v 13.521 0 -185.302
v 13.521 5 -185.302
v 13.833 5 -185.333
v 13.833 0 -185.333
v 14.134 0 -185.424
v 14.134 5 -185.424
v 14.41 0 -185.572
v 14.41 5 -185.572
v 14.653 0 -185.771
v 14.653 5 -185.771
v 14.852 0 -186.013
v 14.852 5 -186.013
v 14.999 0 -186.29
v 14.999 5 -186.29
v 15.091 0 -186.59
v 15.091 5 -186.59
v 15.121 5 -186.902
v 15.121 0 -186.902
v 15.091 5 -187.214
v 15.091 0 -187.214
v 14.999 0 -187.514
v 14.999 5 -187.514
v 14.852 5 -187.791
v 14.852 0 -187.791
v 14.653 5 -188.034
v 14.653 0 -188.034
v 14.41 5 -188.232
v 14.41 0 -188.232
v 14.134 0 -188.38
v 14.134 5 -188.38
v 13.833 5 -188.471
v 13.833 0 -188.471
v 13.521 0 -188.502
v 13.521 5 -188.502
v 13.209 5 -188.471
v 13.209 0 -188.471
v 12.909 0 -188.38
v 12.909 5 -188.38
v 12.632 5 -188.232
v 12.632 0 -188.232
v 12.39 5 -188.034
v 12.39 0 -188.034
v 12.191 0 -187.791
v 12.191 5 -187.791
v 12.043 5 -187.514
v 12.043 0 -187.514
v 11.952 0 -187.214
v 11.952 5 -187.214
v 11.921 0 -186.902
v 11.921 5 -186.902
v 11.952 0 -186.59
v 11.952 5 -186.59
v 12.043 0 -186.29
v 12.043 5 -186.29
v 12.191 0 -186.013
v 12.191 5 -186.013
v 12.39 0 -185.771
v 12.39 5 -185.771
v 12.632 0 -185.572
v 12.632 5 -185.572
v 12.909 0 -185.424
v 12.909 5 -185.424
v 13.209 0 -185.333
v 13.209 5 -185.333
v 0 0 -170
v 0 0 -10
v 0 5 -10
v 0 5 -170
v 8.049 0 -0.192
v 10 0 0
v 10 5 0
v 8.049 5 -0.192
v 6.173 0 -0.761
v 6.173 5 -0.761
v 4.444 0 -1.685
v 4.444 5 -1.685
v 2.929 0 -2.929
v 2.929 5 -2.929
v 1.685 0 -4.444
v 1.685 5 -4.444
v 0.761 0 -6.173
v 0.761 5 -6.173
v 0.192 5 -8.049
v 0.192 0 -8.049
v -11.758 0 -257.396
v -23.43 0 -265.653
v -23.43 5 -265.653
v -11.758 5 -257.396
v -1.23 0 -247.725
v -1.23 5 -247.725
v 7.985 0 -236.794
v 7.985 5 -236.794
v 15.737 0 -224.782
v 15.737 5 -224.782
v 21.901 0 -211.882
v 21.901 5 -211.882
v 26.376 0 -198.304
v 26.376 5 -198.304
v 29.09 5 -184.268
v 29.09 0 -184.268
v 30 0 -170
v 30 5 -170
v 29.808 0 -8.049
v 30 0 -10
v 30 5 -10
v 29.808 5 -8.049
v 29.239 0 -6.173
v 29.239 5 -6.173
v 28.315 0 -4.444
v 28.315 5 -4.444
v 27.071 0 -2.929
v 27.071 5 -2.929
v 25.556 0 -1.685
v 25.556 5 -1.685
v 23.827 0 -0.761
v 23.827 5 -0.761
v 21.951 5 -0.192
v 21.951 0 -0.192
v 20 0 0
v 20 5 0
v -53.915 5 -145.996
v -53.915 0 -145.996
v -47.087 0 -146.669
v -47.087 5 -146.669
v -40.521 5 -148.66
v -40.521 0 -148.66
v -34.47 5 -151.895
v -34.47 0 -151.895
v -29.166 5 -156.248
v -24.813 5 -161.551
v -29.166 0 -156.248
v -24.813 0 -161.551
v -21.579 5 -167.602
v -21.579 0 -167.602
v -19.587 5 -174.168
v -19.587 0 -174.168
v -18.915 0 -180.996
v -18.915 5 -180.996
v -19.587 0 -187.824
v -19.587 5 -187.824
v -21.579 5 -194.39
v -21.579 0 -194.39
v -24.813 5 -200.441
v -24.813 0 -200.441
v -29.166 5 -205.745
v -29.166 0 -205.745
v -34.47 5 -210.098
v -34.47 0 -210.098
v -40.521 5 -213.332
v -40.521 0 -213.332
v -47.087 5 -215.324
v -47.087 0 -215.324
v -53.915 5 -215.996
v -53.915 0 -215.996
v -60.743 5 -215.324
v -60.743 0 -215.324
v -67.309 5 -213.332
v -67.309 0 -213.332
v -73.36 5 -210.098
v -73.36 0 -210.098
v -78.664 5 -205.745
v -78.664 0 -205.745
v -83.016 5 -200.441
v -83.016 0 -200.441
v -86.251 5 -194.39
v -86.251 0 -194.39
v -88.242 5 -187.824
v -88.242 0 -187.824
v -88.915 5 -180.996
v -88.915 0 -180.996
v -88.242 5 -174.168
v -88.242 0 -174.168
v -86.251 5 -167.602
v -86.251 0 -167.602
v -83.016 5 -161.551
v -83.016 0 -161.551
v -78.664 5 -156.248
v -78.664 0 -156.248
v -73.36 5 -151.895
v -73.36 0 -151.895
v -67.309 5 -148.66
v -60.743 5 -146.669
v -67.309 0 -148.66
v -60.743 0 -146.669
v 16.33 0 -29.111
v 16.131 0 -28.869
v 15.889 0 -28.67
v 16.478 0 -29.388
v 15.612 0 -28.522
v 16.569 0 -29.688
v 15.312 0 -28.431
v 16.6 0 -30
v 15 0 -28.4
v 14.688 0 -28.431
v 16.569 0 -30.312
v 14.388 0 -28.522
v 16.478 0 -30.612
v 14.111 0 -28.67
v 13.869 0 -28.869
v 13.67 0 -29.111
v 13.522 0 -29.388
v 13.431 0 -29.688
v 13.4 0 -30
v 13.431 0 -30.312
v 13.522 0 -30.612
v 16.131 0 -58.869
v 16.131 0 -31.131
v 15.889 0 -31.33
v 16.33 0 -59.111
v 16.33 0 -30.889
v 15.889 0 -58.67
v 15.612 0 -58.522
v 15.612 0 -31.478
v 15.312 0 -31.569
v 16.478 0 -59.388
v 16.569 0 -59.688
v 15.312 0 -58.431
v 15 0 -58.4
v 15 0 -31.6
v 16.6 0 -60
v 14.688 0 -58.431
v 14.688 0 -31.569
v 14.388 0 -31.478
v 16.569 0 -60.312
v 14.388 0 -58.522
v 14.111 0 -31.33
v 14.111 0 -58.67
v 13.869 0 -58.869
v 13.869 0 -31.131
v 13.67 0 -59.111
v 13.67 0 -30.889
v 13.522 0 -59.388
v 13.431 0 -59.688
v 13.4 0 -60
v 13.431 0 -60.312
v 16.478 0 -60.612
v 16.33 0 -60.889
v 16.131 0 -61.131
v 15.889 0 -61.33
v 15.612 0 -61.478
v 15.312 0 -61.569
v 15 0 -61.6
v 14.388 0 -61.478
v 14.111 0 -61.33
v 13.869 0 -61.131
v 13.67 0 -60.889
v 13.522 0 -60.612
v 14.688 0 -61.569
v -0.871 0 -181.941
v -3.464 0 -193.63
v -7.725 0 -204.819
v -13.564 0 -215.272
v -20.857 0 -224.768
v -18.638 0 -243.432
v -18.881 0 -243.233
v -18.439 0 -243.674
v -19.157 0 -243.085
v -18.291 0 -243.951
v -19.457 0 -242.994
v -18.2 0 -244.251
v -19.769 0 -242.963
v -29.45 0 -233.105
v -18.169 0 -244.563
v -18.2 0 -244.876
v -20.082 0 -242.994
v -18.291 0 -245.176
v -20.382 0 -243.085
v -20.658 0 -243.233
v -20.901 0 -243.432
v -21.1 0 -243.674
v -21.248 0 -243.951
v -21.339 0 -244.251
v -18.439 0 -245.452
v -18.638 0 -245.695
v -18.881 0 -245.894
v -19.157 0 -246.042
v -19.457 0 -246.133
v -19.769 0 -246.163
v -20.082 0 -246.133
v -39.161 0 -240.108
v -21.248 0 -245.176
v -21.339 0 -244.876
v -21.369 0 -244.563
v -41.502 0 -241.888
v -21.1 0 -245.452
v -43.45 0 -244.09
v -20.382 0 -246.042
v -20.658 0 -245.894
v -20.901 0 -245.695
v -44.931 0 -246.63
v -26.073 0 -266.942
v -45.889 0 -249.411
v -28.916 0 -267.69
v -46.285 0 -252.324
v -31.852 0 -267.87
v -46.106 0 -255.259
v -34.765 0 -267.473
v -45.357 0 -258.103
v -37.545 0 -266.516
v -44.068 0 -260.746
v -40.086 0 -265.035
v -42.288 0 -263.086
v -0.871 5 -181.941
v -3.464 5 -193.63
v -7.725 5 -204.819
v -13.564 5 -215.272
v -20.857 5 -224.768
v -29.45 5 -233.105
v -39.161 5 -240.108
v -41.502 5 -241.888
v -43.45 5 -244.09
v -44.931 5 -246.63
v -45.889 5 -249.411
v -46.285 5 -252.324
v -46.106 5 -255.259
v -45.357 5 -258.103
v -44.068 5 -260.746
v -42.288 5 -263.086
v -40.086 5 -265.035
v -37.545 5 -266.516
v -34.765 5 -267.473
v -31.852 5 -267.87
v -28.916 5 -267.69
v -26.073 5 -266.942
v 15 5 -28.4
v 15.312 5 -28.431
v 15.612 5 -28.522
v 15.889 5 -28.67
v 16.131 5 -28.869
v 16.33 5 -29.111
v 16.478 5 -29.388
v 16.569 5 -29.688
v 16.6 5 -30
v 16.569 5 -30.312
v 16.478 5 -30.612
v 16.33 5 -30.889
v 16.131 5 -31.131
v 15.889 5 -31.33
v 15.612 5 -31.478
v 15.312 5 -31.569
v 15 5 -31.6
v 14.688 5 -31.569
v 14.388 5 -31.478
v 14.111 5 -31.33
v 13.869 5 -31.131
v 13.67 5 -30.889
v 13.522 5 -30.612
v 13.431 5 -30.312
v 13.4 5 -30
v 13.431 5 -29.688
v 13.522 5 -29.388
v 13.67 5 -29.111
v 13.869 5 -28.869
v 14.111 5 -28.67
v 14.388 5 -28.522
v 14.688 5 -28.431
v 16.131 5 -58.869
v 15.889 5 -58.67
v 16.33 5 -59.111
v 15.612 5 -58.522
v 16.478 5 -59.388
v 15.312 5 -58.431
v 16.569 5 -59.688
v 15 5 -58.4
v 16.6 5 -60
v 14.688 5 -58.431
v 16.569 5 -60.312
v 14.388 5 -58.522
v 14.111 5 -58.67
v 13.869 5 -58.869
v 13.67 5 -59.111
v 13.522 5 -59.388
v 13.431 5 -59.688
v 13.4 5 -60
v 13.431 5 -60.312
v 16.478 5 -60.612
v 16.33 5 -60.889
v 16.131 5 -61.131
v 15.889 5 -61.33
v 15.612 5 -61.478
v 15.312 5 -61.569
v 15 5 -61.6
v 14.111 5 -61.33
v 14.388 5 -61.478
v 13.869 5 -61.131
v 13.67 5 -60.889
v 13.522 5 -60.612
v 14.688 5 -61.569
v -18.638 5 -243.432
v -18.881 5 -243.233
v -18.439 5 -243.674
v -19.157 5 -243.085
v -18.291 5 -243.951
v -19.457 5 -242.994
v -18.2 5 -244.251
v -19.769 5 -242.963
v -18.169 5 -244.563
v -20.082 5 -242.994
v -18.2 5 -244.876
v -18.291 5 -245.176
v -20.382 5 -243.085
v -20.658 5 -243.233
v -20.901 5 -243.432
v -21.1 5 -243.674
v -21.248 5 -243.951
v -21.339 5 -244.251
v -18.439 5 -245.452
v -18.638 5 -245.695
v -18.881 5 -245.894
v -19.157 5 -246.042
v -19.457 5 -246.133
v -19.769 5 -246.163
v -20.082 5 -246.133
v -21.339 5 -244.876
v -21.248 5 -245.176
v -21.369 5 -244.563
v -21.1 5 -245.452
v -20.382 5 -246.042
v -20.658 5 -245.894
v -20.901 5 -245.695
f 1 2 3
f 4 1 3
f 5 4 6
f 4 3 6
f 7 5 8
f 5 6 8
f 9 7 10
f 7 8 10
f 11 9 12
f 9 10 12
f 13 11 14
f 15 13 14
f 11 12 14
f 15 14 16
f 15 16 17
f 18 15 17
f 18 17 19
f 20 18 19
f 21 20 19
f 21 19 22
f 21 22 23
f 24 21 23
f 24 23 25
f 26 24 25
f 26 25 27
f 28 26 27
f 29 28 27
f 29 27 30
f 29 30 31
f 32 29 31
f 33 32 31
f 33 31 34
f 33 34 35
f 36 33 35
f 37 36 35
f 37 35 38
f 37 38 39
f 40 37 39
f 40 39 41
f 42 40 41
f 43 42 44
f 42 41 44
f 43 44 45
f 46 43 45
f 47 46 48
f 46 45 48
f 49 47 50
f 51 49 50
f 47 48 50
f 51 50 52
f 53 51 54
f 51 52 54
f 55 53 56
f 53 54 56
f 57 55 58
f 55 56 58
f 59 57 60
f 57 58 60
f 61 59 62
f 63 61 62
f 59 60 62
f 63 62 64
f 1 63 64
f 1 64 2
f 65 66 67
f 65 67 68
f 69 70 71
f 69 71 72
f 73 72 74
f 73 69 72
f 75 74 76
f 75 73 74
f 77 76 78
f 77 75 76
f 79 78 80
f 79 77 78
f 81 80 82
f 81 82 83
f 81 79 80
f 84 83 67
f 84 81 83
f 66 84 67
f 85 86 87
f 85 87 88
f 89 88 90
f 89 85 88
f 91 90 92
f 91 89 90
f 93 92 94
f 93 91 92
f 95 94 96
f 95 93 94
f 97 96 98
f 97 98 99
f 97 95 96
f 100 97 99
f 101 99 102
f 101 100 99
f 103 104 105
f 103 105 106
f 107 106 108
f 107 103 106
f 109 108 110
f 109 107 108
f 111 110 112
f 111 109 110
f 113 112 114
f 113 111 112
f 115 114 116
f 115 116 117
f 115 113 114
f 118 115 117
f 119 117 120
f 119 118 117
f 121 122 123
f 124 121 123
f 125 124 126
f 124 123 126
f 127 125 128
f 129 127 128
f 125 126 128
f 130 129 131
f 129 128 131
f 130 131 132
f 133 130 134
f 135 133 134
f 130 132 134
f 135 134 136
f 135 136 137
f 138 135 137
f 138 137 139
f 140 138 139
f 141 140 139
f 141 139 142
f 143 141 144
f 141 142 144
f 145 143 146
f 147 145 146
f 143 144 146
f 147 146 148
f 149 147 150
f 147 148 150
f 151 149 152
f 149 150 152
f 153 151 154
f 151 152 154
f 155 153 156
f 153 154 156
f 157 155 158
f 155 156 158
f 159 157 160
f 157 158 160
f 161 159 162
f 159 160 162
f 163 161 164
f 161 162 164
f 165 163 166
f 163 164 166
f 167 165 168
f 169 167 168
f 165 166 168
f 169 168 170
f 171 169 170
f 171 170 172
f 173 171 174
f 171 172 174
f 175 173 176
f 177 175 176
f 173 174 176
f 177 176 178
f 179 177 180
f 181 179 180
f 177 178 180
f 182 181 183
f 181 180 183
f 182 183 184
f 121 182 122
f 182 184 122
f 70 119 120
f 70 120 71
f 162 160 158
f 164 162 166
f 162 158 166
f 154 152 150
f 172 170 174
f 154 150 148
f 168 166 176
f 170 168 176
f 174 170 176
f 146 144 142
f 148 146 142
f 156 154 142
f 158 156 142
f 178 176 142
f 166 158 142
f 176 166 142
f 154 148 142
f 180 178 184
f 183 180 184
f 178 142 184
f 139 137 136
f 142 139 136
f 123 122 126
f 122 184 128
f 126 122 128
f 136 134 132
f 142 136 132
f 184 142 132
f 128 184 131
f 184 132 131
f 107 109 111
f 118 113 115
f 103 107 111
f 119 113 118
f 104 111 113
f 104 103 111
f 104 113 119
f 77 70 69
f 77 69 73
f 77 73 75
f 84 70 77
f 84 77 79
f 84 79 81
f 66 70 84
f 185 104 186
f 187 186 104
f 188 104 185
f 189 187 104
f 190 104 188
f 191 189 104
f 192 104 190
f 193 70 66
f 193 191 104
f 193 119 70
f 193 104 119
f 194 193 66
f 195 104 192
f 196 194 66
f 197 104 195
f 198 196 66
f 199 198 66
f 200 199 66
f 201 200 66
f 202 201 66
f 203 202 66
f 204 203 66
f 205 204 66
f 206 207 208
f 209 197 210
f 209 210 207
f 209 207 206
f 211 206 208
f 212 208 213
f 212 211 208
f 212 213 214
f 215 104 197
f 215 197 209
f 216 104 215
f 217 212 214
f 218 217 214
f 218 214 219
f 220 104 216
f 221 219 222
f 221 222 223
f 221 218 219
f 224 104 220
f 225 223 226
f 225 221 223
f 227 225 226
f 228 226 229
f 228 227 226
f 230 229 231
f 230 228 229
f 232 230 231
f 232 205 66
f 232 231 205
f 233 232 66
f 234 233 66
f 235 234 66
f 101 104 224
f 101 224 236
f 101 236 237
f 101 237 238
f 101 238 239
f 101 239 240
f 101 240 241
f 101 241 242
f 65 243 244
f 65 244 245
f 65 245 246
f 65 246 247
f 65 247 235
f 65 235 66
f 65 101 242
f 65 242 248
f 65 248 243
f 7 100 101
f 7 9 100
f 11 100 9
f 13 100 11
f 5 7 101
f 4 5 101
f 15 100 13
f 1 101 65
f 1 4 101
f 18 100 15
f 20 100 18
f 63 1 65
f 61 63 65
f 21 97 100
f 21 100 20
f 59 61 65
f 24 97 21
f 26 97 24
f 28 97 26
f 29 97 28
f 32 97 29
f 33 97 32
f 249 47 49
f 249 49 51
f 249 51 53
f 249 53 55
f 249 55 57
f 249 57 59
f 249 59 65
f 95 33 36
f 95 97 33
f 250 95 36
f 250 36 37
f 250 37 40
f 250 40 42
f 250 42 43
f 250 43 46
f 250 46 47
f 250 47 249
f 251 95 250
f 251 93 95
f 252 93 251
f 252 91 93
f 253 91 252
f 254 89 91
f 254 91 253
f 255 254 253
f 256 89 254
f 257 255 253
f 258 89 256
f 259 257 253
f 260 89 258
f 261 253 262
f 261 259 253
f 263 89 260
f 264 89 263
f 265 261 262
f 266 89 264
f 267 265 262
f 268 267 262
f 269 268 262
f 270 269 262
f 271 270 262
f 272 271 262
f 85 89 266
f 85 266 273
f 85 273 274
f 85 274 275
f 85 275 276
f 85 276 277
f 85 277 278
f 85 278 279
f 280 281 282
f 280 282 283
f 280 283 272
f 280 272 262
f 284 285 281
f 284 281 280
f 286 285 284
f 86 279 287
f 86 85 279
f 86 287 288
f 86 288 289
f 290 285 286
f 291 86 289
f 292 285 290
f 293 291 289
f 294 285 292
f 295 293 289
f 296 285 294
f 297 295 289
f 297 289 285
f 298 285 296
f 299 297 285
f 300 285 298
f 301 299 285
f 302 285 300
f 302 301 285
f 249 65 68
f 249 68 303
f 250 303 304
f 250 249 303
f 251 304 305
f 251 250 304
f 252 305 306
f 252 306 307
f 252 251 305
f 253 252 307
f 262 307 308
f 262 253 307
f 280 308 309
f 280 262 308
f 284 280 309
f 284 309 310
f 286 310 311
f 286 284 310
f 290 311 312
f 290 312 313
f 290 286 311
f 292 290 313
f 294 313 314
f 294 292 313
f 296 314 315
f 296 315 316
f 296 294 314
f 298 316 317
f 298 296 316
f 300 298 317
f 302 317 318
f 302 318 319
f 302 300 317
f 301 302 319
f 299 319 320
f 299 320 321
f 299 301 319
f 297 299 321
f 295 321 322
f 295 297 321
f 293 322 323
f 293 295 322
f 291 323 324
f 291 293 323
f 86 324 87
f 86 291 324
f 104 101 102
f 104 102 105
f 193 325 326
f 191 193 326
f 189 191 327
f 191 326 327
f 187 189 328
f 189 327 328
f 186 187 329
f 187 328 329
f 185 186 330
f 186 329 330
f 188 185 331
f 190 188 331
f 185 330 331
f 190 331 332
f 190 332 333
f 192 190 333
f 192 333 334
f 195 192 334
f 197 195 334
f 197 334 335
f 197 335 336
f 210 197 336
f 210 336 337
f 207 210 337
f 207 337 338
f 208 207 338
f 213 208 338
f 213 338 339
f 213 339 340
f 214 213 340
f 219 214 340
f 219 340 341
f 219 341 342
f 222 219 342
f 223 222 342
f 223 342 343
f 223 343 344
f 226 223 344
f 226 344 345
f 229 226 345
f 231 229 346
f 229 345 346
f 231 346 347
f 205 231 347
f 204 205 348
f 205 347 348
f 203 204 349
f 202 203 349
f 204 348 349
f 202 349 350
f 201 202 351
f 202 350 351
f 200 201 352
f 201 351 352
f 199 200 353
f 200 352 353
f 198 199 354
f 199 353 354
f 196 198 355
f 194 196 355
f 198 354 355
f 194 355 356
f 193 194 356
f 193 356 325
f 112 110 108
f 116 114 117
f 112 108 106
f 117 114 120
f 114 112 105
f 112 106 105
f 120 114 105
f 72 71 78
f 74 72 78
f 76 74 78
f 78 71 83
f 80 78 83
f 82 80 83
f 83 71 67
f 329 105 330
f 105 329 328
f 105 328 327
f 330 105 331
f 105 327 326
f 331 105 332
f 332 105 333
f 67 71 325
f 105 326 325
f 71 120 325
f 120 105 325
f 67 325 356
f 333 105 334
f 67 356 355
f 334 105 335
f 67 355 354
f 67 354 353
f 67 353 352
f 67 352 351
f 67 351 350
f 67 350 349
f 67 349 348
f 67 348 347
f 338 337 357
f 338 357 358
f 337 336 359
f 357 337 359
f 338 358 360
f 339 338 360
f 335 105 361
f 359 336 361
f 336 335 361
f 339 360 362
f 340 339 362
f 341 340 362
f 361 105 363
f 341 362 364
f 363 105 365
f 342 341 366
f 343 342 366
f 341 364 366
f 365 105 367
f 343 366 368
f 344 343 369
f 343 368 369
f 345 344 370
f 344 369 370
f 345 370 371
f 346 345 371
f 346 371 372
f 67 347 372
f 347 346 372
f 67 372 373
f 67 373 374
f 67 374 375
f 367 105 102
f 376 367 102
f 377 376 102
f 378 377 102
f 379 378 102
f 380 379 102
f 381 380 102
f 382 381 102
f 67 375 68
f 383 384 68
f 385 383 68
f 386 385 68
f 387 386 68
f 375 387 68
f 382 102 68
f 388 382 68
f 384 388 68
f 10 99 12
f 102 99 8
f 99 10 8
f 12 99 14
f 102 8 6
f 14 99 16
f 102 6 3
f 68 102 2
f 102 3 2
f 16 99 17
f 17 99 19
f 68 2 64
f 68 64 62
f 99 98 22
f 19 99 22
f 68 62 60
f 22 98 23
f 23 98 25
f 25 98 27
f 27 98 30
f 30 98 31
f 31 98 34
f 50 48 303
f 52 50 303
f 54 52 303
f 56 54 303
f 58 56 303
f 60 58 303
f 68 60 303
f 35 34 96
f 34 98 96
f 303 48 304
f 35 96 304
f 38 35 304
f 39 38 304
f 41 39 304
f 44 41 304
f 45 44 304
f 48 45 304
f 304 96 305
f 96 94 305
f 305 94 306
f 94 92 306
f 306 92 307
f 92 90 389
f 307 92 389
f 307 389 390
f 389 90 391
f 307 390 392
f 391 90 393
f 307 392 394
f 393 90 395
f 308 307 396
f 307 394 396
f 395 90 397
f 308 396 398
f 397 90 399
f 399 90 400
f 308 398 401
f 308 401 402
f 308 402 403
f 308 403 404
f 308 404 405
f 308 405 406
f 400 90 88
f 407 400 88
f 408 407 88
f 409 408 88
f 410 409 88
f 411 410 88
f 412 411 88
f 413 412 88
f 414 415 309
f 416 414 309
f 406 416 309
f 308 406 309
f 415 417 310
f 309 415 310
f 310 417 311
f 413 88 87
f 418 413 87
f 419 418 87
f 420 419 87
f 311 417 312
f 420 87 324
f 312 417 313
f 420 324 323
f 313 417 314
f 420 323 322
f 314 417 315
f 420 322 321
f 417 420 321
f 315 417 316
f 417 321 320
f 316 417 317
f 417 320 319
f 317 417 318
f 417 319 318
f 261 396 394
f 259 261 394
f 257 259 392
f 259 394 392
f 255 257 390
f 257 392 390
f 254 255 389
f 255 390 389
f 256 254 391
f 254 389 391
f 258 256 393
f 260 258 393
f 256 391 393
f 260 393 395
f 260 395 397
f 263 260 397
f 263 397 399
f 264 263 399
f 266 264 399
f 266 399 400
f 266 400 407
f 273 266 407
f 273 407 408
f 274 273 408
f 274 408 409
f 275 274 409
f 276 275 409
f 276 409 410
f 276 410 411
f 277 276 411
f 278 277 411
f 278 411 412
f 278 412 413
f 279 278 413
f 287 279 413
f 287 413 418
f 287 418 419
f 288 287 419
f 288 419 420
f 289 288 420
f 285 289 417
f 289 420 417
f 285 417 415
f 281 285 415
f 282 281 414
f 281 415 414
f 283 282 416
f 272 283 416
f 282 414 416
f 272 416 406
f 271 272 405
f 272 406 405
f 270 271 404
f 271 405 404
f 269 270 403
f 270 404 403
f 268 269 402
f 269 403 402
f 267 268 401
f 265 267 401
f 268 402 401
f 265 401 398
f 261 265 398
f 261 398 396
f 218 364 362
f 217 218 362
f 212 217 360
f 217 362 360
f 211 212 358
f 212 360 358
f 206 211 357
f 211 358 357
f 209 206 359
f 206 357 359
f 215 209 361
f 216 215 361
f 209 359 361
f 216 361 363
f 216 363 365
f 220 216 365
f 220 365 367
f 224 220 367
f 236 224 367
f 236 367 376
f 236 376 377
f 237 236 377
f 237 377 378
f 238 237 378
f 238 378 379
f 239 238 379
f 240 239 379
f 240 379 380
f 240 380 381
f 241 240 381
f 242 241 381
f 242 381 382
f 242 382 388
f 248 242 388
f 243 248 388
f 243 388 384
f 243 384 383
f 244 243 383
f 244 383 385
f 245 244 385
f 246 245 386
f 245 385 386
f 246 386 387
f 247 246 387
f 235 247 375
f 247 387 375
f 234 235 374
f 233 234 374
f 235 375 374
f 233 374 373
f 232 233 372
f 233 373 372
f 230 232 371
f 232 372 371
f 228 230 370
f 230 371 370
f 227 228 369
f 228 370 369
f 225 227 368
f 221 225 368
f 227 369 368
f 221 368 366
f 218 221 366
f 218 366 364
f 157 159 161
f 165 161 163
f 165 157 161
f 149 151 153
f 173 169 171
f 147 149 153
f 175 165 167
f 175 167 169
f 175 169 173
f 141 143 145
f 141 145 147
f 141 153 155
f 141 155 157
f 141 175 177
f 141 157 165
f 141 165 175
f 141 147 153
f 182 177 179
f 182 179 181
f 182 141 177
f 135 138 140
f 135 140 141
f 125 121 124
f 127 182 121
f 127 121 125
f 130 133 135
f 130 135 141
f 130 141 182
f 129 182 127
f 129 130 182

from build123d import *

# Parameters (mm, degrees)
SKETCH_1_R          = 35
EXTRUDE_1_DEPTH     = 5
EXTRUDE_1_2_DEPTH   = 5
SKETCH_2_R          = 1.6
CUT_EXTRUDE_2_DEPTH = 283.295346414
SKETCH_3_R          = 1.6
CUT_EXTRUDE_3_DEPTH = 10


with BuildPart() as part:
    # 草圖1 → 伸長1 (new body)
    with BuildSketch(Plane(origin=(0, 0, 0), x_dir=(1, 0, 0), z_dir=(0, 1, 0))):
        with Locations(Location((-53.914829359, 180.996261194, 0), (0, 0, 270))):
            Circle(SKETCH_1_R)
    extrude(amount=EXTRUDE_1_DEPTH)


with BuildPart() as body_2:
    # 草圖1 → Extrude 1 2 (new body)
    with BuildSketch(Plane(origin=(0, 0, 0), x_dir=(1, 0, 0), z_dir=(0, 1, 0))):
        with BuildLine():
            Line((0, 50), (0, 170))
            ThreePointArc((0, 170), (-10.45393829, 210.151929814), (-39.161133702, 240.107884566))
            ThreePointArc((-39.161133702, 240.107884566), (-44.067899797, 260.745802254), (-23.429982109, 265.652568349))
            ThreePointArc((-23.429982109, 265.652568349), (15.737038666, 224.781787165), (30, 170))
            Line((30, 170), (30, 50))
            Line((30, 50), (30, 10))
            ThreePointArc((30, 10), (27.071067812, 2.928932188), (20, 0))
            Line((20, 0), (10, 0))
            ThreePointArc((10, 0), (2.928932188, 2.928932188), (0, 10))
            Line((0, 10), (0, 50))
        make_face()
    extrude(amount=EXTRUDE_1_2_DEPTH)

    # 草圖2 → 伸長2 (cut, through all)
    with BuildSketch(Plane(origin=(0, 5, 0), x_dir=(1, 0, 0), z_dir=(0, 1, 0))):
        with Locations(Location((15, 60, 0), (0, 0, 270))):
            Circle(SKETCH_2_R)
        with Locations(Location((15, 30, 0), (0, 0, 270))):
            Circle(SKETCH_2_R)
    extrude(amount=-CUT_EXTRUDE_2_DEPTH, mode=Mode.SUBTRACT)

    # 草圖3 → 伸長3 (cut)
    with BuildSketch(Plane(origin=(0, 5, 0), x_dir=(1, 0, 0), z_dir=(0, 1, 0))):
        with Locations(Location((13.52125372, 186.902147325, 0), (0, 0, 270))):
            Circle(SKETCH_3_R)
        with Locations(Location((-19.769477737, 244.56338563, 0), (0, 0, 270))):
            Circle(SKETCH_3_R)
    extrude(amount=-CUT_EXTRUDE_3_DEPTH, mode=Mode.SUBTRACT)


solid = Compound([part.part, body_2.part])
